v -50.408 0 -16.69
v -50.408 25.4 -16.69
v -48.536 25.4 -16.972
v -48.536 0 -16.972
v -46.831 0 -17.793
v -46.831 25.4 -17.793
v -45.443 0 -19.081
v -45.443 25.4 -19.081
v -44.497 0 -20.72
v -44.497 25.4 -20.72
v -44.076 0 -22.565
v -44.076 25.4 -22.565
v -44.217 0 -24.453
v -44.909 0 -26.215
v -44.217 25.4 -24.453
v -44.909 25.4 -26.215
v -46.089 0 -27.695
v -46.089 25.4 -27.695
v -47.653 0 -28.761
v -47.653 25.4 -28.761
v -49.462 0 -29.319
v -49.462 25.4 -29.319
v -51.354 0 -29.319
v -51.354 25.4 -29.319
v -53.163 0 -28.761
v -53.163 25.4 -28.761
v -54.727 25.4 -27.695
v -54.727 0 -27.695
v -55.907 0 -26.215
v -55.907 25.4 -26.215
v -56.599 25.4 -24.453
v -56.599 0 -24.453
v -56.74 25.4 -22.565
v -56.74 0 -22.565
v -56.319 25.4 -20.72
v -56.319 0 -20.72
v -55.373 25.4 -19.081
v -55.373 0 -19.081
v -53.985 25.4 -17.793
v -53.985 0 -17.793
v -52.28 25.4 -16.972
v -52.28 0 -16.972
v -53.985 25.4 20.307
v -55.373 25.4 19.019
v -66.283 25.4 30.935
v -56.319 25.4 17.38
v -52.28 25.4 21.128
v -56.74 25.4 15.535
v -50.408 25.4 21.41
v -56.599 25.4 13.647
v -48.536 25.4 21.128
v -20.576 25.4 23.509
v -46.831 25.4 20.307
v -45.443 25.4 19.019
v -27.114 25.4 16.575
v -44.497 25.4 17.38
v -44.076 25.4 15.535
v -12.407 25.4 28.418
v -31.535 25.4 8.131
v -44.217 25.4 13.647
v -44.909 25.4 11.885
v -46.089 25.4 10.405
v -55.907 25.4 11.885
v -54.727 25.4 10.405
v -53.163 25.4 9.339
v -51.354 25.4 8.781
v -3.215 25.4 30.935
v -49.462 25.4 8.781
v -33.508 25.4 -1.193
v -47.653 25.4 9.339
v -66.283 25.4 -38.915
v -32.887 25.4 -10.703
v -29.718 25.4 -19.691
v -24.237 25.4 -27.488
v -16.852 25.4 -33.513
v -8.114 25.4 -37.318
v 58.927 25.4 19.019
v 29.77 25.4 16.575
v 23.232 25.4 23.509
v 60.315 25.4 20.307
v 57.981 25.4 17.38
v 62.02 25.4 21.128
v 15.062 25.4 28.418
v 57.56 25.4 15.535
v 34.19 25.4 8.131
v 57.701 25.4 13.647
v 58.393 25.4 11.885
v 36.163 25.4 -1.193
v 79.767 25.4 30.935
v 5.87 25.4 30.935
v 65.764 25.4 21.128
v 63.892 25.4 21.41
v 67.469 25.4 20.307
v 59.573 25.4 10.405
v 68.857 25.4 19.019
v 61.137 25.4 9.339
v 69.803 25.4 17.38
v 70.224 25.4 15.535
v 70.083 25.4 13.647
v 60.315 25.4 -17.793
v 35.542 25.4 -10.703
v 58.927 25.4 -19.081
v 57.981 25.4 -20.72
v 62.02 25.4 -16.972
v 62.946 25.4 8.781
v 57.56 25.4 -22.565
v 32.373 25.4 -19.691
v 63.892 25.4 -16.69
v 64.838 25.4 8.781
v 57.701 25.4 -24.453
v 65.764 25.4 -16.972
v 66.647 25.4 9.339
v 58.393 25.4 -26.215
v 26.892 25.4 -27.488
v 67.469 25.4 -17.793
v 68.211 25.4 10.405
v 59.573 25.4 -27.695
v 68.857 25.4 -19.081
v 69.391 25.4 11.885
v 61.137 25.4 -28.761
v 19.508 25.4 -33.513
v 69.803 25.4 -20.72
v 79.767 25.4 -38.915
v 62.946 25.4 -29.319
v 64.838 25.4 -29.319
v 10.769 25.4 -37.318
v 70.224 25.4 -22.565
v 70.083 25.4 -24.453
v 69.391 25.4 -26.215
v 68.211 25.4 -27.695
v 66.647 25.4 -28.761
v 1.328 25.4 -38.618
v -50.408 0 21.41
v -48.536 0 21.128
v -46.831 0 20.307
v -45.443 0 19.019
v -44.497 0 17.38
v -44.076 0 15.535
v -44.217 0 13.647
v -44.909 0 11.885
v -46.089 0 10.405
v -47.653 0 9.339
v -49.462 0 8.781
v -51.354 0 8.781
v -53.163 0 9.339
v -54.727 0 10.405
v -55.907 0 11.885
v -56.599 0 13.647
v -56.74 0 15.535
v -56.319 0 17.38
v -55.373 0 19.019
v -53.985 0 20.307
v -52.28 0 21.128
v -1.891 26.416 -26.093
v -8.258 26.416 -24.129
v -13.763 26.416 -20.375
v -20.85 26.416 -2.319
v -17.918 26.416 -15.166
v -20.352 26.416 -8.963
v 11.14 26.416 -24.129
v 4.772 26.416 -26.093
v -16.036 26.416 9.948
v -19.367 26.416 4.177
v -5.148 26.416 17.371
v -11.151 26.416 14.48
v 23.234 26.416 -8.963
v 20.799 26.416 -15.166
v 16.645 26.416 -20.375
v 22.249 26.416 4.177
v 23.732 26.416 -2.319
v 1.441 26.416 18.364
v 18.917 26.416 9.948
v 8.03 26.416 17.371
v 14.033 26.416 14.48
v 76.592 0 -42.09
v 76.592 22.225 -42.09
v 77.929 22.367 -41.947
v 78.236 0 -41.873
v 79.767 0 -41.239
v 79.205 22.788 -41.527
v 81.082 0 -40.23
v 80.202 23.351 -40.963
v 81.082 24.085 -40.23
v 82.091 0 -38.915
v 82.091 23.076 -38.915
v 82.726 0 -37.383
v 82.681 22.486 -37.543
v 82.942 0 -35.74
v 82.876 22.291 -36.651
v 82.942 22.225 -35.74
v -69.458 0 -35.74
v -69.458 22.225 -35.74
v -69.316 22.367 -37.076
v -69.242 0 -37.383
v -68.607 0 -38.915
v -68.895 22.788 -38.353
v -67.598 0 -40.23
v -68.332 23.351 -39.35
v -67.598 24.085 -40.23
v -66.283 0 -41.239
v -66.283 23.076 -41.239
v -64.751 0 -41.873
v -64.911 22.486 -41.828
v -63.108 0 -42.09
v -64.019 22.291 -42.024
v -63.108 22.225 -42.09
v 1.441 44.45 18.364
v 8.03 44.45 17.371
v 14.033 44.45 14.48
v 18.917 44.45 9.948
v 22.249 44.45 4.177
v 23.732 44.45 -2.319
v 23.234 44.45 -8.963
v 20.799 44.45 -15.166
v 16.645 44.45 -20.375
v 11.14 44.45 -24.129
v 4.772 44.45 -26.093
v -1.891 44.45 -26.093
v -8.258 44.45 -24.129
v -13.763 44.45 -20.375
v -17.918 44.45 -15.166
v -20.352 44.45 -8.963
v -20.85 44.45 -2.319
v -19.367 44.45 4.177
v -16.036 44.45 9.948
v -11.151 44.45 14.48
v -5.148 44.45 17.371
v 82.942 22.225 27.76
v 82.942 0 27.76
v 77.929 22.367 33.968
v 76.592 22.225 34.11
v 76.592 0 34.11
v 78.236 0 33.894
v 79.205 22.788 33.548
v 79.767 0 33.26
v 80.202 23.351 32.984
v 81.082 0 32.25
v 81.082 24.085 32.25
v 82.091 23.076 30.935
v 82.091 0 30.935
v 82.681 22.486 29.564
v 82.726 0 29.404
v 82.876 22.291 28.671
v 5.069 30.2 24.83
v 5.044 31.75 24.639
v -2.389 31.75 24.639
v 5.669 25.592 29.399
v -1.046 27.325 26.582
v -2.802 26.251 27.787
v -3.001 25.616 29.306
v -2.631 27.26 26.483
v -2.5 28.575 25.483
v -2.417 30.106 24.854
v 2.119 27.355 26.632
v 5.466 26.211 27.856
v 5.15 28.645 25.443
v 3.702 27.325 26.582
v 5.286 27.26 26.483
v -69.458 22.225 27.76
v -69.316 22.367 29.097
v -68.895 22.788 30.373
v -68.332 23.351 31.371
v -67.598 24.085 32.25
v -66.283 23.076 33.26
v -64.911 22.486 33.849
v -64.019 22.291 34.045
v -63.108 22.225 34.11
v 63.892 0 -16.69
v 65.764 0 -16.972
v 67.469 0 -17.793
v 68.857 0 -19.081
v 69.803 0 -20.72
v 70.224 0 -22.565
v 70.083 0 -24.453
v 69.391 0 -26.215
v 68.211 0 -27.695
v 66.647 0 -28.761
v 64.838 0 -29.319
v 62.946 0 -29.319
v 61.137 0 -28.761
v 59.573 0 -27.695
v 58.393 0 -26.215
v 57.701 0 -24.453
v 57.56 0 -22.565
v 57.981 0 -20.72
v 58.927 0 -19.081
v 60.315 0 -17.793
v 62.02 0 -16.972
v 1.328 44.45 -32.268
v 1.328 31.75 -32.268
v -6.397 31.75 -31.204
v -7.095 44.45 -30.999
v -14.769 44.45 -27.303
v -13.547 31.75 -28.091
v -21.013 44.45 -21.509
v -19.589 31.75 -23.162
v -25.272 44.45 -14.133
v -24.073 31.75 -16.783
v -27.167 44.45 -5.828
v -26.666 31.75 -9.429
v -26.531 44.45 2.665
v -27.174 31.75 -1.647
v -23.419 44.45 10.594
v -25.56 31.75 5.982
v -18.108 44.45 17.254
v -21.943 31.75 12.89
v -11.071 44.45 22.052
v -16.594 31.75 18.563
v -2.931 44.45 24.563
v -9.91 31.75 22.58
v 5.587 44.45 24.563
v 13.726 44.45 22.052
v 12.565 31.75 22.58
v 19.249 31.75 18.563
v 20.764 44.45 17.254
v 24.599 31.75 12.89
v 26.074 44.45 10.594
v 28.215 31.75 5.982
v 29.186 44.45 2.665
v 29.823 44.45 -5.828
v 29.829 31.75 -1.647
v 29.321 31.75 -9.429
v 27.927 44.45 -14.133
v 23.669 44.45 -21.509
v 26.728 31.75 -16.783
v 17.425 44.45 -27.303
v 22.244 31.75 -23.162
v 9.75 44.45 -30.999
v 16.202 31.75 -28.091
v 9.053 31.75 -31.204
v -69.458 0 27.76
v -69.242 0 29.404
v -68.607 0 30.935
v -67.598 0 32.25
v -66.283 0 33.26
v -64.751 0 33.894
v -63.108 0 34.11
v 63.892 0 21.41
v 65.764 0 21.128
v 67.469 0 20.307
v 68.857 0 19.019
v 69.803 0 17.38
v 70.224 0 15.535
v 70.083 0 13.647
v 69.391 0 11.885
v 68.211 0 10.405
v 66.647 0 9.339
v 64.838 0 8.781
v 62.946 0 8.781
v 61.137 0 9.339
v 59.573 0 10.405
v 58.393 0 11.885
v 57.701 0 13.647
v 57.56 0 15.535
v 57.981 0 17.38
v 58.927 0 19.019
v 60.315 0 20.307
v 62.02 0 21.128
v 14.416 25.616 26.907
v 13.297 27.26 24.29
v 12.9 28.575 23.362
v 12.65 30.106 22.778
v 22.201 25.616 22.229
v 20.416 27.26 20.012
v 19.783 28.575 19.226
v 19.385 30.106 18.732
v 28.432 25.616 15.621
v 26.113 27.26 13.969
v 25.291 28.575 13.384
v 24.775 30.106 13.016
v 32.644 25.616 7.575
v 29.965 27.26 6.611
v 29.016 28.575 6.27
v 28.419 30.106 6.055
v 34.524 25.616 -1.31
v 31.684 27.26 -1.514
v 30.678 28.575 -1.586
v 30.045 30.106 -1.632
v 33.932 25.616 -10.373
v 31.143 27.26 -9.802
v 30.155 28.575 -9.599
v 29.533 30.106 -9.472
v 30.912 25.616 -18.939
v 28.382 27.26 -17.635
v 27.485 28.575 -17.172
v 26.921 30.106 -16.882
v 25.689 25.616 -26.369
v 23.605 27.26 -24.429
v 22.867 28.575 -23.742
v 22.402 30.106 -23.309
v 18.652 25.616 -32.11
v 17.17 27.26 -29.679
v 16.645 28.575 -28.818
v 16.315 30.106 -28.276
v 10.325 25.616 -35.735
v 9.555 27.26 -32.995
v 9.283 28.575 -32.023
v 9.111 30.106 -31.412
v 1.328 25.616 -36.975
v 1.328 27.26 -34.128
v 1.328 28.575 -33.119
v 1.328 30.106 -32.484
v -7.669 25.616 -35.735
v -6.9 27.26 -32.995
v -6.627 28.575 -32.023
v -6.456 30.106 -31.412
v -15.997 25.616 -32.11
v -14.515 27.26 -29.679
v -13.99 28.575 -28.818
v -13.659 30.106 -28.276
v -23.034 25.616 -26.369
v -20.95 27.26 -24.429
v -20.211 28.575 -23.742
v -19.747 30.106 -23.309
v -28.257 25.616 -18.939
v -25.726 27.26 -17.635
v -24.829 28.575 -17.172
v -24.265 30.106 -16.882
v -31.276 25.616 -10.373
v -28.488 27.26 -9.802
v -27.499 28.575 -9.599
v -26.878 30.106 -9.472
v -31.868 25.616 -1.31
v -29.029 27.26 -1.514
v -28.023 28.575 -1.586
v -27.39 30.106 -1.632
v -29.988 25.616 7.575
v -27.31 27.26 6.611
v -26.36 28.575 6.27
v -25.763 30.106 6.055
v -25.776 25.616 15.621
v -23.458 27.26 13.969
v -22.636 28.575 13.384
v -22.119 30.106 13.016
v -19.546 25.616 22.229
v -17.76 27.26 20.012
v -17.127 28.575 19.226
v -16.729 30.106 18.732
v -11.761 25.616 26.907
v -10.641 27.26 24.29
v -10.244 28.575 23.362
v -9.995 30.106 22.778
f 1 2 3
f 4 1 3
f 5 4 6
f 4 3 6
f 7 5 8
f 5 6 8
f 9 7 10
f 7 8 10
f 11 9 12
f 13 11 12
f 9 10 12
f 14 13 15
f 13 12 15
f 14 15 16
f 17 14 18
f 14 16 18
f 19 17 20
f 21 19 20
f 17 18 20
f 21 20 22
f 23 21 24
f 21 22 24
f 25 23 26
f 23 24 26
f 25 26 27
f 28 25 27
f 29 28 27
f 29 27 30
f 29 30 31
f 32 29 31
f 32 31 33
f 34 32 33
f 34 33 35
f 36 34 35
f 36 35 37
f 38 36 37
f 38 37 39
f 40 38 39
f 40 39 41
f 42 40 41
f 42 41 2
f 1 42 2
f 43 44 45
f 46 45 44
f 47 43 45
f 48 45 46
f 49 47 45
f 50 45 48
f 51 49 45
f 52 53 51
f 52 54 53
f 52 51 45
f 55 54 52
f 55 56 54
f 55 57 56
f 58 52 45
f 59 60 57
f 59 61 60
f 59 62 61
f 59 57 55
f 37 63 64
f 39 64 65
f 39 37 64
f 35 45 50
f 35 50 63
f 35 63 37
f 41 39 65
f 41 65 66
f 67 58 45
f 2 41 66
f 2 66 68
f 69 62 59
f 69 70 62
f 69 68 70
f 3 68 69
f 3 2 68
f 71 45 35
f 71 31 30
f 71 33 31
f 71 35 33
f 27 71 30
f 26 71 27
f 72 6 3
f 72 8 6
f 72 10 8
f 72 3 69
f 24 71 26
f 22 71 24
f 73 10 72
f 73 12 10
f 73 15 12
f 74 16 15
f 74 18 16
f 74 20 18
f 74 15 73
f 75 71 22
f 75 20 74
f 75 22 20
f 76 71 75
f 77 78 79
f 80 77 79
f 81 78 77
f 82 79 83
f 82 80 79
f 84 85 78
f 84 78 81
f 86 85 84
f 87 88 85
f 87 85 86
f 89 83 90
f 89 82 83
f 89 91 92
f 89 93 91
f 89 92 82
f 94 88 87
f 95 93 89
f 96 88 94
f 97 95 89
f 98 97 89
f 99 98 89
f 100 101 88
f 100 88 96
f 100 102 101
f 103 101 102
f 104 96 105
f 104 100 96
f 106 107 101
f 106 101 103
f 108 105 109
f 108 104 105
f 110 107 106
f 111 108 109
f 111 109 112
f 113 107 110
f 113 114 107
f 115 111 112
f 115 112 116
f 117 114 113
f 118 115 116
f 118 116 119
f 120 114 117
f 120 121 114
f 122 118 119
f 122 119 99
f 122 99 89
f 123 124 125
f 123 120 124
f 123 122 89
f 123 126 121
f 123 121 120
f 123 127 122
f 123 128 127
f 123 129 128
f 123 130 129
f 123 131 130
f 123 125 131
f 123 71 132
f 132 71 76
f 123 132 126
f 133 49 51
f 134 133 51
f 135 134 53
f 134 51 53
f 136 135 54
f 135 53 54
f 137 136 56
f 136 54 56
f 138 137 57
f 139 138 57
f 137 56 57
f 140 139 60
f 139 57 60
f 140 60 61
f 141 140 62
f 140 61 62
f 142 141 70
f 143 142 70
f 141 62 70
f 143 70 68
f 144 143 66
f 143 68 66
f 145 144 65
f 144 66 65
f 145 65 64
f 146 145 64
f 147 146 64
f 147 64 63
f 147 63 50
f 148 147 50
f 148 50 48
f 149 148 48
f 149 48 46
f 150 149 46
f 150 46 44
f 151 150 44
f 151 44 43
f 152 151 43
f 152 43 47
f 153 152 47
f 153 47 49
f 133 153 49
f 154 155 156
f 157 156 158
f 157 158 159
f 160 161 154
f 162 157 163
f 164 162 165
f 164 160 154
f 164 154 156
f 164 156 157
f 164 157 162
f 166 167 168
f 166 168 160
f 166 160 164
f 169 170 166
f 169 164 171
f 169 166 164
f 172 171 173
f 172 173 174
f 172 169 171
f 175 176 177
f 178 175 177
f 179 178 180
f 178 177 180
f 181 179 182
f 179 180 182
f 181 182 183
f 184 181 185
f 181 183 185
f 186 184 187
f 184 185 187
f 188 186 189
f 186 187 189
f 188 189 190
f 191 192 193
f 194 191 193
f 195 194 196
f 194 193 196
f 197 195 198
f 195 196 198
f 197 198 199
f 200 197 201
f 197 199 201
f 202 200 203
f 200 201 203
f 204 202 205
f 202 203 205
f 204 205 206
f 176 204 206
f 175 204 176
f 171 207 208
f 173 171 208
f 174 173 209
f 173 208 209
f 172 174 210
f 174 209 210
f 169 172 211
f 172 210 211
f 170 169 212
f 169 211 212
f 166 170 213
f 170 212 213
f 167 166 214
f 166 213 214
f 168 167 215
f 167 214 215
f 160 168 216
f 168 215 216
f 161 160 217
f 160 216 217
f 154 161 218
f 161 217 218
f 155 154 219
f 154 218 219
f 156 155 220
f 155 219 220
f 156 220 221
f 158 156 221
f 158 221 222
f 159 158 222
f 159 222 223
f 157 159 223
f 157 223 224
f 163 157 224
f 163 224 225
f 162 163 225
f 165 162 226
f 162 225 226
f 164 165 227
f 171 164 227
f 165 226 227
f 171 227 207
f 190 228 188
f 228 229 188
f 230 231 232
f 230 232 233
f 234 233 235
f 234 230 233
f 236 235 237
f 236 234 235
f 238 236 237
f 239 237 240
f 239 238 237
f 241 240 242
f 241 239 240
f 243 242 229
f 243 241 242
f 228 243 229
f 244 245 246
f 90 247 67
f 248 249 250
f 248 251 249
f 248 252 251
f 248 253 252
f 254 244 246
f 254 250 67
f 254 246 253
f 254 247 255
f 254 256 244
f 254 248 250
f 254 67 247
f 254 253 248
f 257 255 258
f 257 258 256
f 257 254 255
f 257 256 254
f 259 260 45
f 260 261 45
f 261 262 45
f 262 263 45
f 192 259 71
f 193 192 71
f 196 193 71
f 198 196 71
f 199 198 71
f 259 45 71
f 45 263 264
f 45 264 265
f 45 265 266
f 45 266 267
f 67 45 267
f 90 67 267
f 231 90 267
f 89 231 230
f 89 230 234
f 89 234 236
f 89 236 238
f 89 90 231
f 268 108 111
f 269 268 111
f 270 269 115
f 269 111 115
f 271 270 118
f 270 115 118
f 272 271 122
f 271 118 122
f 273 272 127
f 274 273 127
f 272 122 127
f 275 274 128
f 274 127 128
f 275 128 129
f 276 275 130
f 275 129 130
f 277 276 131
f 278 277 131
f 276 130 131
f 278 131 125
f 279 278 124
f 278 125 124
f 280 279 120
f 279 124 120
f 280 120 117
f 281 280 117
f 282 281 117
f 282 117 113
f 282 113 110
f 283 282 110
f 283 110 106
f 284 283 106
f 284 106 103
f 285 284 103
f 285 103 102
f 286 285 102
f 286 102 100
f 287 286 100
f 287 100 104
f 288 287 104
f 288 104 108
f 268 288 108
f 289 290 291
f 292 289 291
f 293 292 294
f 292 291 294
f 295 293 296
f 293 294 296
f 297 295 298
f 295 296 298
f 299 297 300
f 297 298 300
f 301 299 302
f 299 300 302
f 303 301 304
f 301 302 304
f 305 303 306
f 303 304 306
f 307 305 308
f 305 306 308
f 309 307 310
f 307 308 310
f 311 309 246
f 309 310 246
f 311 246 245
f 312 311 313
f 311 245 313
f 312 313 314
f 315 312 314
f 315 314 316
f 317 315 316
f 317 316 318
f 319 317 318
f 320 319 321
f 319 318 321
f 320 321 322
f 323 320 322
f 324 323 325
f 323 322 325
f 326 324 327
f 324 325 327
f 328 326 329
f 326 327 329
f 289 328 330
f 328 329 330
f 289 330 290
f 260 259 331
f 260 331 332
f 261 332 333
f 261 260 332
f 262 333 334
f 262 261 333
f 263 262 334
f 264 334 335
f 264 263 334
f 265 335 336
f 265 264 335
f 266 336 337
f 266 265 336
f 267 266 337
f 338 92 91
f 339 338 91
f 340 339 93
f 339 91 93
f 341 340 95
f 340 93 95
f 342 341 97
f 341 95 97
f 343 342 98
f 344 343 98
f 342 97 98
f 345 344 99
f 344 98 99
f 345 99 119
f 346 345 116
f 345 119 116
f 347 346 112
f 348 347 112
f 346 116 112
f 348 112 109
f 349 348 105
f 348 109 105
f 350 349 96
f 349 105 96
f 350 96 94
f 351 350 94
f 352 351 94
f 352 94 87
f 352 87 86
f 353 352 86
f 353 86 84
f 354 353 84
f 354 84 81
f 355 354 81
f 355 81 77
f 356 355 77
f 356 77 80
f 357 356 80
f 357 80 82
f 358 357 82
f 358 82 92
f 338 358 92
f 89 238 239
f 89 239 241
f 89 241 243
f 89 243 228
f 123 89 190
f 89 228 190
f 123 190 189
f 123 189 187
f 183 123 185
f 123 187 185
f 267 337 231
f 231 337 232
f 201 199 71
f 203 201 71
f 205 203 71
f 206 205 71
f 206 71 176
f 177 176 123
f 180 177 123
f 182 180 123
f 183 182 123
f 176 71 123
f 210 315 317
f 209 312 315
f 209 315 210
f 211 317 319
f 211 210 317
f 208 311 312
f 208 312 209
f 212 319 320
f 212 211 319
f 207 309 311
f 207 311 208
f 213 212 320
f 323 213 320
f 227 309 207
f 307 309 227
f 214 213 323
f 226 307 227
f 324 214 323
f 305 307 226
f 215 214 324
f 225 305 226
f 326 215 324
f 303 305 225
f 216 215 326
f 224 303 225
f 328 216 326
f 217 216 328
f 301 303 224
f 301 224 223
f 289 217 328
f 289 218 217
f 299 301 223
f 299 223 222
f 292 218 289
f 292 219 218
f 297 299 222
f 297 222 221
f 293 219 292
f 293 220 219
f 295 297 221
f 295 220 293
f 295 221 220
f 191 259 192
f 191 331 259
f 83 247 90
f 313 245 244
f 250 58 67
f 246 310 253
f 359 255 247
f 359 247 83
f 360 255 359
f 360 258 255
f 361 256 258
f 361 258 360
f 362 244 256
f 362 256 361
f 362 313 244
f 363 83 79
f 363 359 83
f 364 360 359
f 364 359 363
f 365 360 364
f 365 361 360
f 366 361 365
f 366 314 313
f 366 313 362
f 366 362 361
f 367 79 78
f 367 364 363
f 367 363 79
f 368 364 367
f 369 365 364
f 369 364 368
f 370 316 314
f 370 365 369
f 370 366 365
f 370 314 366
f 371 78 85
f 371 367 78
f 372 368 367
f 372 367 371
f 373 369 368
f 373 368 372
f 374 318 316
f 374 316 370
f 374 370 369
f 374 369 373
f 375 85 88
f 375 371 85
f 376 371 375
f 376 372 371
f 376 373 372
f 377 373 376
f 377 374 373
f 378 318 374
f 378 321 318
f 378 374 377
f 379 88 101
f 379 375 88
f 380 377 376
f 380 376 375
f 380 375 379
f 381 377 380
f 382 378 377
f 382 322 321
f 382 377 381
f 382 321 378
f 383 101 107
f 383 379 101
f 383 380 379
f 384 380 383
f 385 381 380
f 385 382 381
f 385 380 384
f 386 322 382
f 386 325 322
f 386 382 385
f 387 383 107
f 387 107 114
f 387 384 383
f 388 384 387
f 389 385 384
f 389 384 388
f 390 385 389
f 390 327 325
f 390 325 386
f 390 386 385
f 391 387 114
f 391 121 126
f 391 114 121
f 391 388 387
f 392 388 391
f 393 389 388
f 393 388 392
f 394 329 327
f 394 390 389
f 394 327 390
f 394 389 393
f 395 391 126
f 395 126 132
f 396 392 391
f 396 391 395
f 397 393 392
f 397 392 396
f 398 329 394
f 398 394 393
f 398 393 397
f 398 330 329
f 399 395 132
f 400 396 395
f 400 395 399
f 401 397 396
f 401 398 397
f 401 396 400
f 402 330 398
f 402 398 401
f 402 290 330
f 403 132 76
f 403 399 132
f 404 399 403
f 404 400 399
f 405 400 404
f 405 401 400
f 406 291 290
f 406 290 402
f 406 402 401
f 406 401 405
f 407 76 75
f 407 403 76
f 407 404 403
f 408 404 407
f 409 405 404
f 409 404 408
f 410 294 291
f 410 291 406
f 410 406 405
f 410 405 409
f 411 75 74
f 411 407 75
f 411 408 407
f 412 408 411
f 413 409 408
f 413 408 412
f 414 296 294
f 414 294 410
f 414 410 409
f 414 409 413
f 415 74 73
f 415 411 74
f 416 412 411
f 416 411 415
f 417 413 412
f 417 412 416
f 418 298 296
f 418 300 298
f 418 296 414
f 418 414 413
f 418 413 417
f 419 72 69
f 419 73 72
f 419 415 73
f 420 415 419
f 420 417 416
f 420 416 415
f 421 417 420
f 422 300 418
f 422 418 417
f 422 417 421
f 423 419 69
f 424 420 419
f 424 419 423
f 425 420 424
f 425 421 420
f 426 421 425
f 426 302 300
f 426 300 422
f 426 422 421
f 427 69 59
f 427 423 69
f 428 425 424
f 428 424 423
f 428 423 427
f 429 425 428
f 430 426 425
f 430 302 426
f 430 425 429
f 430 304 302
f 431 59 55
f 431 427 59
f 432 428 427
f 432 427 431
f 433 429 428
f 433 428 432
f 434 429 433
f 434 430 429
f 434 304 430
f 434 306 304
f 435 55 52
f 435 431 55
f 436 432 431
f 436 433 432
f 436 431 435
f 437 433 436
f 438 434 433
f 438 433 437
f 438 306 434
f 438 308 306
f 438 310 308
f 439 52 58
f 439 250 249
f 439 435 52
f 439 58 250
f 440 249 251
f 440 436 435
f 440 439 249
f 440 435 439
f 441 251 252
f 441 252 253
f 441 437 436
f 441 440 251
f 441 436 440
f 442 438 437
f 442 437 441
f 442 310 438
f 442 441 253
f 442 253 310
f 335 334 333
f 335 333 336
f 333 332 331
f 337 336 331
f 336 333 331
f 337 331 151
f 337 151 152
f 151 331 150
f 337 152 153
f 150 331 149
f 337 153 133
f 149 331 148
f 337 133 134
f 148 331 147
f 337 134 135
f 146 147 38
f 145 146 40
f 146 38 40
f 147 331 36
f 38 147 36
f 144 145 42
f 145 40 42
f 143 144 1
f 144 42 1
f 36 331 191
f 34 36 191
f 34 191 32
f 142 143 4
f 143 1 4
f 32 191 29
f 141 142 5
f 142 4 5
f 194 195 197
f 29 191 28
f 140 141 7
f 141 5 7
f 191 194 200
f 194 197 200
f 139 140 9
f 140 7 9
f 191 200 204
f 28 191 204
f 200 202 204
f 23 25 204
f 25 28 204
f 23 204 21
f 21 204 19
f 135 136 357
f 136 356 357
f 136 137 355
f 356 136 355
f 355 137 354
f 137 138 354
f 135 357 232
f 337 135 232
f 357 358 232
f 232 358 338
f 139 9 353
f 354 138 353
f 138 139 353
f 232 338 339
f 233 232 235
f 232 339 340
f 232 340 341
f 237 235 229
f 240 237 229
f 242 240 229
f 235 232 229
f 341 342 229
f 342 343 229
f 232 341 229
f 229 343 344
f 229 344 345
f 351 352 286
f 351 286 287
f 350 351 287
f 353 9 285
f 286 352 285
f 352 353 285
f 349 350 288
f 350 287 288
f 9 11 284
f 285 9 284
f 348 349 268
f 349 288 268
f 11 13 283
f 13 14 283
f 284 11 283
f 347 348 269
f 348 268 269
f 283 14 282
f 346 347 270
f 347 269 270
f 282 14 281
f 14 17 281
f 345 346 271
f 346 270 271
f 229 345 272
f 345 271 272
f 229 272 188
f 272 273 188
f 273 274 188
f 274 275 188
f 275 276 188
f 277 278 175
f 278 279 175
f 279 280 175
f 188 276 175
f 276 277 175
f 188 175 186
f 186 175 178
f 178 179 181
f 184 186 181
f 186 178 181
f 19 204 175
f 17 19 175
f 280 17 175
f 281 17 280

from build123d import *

# Parameters (mm, degrees)
SKETCH3_W           = 152.4
SKETCH3_H           = 76.2
BOSS_EXTRUDE2_DEPTH = 25.4
SKETCH4_R           = 6.35
CUT_EXTRUDE1_DEPTH  = 97.416192211
SKETCH5_R           = 28.575
BOSS_EXTRUDE3_DEPTH = 19.05
SKETCH6_R           = 22.353274987
CUT_EXTRUDE3_DEPTH  = 18.034
CHAMFER1_SIZE       = 3.175
FILLET1_R           = 6.35


with BuildPart() as part:
    # Sketch3 → Boss-Extrude2 (new body)
    with BuildSketch(Plane(origin=(0, 0, 0), x_dir=(1, 0, 0), z_dir=(0, 1, 0))):
        with Locations((6.742008695, 3.989729317)):
            Rectangle(SKETCH3_W, SKETCH3_H)
    extrude(amount=BOSS_EXTRUDE2_DEPTH)

    # Sketch4 → Cut-Extrude1 (cut, through all)
    with BuildSketch(Plane(origin=(0, 25.4, 0), x_dir=(1, 0, 0), z_dir=(0, 1, 0))):
        with Locations(Location((-50.407991305, 23.039729317, 0), (0, 0, 270))):
            Circle(SKETCH4_R)
        with Locations(Location((-50.407991305, -15.060270683, 0), (0, 0, 270))):
            Circle(SKETCH4_R)
        with Locations(Location((63.892008695, 23.039729317, 0), (0, 0, 270))):
            Circle(SKETCH4_R)
        with Locations(Location((63.892008695, -15.060270683, 0), (0, 0, 270))):
            Circle(SKETCH4_R)
    extrude(amount=-CUT_EXTRUDE1_DEPTH, mode=Mode.SUBTRACT)

    # Sketch5 → Boss-Extrude3 (add)
    with BuildSketch(Plane(origin=(0, 25.4, 0), x_dir=(1, 0, 0), z_dir=(0, 1, 0))):
        with Locations(Location((1.327722903, 3.693056123, 0), (0, 0, 90))):
            Circle(SKETCH5_R)
    extrude(amount=BOSS_EXTRUDE3_DEPTH)

    # Sketch6 → Cut-Extrude3 (cut)
    with BuildSketch(Plane(origin=(0, 44.45, 0), x_dir=(1, 0, 0), z_dir=(0, 1, 0))):
        with Locations(Location((1.440777923, 3.989157158, 0), (0, 0, 270))):
            Circle(SKETCH6_R)
    extrude(amount=-CUT_EXTRUDE3_DEPTH, mode=Mode.SUBTRACT)

    # Chamfer1
    chamfer1_edges = [part.edges().sort_by_distance(p)[0] for p in [
        (82.942008695, 25.4, -3.989729317),
        (6.742008695, 25.4, -42.089729317),
        (-69.457991305, 25.4, -3.989729317),
        (6.742008695, 25.4, 34.110270683),
    ]]
    chamfer(chamfer1_edges, length=CHAMFER1_SIZE)

    # Fillet1
    fillet1_edges = [part.edges().sort_by_distance(p)[0] for p in [
        (1.327722903, 25.4, 24.881943877),
        (-69.457991305, 11.1125, 34.110270683),
        (-69.457991305, 11.1125, -42.089729317),
        (82.942008695, 11.1125, -42.089729317),
        (82.942008695, 11.1125, 34.110270683),
    ]]
    fillet(fillet1_edges, radius=FILLET1_R)


solid = part.part
